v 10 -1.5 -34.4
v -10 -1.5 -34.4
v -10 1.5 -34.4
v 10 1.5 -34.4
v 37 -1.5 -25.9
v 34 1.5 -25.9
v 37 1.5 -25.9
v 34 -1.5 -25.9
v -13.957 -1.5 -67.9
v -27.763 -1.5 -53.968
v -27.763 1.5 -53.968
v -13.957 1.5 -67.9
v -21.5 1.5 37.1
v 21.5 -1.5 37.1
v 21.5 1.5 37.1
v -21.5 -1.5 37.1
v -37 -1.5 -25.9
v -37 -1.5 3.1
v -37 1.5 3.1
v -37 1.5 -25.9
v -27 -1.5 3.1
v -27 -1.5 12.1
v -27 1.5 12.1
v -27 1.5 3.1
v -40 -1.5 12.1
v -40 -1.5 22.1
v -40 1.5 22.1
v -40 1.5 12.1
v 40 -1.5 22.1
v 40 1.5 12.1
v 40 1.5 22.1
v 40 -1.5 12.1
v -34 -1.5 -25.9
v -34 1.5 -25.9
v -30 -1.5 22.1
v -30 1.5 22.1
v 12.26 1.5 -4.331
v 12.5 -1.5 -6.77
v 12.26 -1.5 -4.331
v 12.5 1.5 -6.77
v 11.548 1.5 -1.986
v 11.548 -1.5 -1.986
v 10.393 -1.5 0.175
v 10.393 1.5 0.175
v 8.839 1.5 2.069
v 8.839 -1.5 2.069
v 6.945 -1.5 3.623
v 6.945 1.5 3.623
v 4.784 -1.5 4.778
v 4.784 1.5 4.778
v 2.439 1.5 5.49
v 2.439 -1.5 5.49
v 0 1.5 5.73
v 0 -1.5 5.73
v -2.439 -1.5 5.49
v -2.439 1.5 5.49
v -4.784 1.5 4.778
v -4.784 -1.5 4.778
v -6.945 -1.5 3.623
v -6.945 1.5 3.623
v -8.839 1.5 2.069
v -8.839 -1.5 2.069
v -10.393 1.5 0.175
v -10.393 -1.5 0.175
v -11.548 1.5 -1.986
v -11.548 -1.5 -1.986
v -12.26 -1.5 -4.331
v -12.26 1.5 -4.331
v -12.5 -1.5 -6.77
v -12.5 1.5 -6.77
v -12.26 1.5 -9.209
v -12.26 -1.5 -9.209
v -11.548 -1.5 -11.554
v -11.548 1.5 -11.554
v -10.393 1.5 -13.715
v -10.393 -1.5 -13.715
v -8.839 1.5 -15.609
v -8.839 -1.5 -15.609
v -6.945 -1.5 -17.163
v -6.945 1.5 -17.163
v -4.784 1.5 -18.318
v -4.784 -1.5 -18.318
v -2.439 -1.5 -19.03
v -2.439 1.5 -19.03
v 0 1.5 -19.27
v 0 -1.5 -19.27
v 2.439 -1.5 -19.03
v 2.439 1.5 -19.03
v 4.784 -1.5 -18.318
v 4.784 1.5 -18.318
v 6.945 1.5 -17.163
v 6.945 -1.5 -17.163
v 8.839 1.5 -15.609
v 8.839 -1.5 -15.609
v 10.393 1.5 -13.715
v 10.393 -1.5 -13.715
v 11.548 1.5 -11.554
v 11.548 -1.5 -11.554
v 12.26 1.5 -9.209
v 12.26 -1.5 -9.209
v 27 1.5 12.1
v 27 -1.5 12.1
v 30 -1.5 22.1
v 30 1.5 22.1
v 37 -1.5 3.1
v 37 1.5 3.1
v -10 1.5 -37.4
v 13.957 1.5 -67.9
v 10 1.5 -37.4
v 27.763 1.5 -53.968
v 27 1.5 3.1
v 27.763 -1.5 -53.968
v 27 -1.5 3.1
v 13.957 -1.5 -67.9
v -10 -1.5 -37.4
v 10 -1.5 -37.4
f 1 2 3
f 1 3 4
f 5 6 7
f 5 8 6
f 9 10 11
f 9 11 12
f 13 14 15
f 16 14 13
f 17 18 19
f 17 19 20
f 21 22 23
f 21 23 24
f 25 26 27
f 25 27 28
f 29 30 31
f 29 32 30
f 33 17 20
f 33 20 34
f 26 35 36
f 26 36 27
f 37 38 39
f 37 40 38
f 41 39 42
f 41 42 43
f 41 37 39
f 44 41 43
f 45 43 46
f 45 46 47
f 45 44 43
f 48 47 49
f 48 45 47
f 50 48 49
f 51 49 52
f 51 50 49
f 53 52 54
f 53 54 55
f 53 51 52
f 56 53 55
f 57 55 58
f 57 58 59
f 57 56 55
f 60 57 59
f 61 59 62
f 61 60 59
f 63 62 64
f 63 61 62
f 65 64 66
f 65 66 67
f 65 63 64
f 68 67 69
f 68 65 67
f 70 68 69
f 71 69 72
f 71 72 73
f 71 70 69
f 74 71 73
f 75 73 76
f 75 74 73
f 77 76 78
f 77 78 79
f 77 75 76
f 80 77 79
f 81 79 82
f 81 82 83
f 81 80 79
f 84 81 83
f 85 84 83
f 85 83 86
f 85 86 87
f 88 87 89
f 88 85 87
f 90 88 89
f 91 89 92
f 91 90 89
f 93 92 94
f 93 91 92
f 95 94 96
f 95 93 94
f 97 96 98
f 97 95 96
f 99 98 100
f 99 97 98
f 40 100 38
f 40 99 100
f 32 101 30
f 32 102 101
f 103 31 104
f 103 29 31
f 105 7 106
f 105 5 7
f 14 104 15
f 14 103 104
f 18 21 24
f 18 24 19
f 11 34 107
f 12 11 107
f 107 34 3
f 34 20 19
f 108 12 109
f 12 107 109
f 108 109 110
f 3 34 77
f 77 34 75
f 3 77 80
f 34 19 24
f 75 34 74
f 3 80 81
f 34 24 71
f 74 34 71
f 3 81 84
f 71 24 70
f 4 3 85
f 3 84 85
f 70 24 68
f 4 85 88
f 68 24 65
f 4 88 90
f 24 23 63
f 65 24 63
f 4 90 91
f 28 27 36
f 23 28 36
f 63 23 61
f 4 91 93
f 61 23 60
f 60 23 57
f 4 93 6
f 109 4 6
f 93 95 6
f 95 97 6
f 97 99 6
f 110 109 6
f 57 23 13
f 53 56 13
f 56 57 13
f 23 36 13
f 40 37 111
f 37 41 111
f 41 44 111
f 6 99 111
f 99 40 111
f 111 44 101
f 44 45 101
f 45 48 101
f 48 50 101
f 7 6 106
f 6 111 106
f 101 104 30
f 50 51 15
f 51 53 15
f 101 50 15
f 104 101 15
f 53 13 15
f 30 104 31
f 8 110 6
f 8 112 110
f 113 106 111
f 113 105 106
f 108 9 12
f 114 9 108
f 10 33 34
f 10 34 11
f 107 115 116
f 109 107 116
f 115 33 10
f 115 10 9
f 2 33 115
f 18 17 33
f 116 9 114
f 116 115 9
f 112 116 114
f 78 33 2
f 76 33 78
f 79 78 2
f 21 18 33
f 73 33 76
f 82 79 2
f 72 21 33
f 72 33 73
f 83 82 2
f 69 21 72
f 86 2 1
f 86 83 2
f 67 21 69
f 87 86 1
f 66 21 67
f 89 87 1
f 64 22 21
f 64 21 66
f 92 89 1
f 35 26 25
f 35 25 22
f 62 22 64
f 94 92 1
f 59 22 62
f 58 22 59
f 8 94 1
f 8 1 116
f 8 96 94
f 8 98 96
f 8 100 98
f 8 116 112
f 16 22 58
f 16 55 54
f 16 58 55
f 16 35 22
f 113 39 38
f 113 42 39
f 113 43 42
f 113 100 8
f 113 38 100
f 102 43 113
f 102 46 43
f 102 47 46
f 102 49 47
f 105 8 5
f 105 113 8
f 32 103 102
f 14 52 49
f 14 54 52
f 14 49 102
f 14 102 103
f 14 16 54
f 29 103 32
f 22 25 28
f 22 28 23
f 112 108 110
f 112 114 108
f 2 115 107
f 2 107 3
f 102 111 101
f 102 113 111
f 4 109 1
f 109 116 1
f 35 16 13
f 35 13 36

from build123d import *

# Parameters (mm, degrees)
F0_W     = 20
F0_H     = 3
F0_R     = 12.5
F1_DEPTH = 1.5


with BuildPart() as f1:
    # F0 (on Front) → F1 (new body, symmetric)
    with BuildSketch(Plane.XZ):
        Polygon((30, 22.1), (21.5, 37.1), (-21.5, 37.1), (-30, 22.1), (-40, 22.1), (-40, 12.1), (-27, 12.1), (-27, 3.1), (-37, 3.1), (-37, -25.9), (-34, -25.9), (-27.7626620175, -53.9680209211), (-13.9565678727, -67.9), (13.9565678727, -67.9), (27.7626620175, -53.9680209211), (34, -25.9), (37, -25.9), (37, 3.1), (27, 3.1), (27, 12.1), (40, 12.1), (40, 22.1), align=None)
        with Locations((0, -35.9)):
            Rectangle(F0_W, F0_H, mode=Mode.SUBTRACT)
        with Locations((0, -6.77)):
            Circle(F0_R, mode=Mode.SUBTRACT)
    extrude(amount=F1_DEPTH, both=True)


solid = f1.part
